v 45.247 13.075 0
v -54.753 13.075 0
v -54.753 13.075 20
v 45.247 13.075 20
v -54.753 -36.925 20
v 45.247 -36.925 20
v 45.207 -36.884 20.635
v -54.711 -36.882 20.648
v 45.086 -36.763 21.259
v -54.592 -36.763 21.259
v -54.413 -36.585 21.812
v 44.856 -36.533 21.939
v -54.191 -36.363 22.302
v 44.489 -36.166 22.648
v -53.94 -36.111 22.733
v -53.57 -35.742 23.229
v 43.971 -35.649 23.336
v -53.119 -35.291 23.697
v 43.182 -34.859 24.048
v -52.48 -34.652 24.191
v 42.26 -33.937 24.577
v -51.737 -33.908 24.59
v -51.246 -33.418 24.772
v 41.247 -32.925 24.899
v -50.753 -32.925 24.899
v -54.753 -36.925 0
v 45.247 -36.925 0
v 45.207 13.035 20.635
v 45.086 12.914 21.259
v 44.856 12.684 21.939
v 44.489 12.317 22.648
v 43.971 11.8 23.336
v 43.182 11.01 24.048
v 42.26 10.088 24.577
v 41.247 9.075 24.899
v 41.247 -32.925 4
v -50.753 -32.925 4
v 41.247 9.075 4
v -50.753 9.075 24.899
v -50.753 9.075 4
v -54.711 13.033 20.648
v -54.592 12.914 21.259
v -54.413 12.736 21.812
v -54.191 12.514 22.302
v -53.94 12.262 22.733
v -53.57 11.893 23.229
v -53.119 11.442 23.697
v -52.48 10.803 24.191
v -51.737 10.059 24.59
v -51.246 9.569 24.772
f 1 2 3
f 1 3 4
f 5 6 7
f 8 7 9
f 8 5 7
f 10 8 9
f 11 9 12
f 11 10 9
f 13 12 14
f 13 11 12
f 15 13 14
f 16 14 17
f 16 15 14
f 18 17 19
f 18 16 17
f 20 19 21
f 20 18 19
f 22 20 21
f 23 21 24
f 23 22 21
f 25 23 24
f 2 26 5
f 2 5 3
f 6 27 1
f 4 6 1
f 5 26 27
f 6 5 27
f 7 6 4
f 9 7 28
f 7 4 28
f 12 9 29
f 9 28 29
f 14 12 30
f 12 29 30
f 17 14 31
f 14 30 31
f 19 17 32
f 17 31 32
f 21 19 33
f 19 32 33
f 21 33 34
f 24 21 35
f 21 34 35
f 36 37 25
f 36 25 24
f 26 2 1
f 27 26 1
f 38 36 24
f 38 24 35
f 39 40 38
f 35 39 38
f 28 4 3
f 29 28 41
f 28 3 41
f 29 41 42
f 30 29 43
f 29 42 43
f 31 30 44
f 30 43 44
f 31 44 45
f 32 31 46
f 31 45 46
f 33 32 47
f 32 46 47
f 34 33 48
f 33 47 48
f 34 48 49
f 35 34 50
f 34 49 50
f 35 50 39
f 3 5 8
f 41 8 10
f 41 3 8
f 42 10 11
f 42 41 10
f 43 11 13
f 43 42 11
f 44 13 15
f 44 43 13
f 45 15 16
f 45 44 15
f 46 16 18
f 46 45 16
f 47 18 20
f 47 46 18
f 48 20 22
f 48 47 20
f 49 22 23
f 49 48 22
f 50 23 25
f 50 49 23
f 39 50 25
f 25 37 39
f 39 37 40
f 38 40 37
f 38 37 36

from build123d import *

# Parameters (mm, degrees)
F0_W        = 100
F0_H        = 50
F1_DEPTH    = 25
F2_T        = -4
F3_T1_DEPTH = 75
F3_T3_DEPTH = 125


# Not quite as in the source:
# - a fillet or chamfer that OpenCascade refuses, or shapes differently, is made with other operations: its cross-section is extruded or revolved along the edge and cut away or added


with BuildPart() as f1:
    # F0 (on Top) → F1 (new body)
    with BuildSketch(Plane.XY):
        with Locations((-4.7528631985, -11.9245312498)):
            Rectangle(F0_W, F0_H)
    extrude(amount=F1_DEPTH)

    # F2
    f2_openings = [f1.faces().sort_by_distance(p)[0] for p in [
        (-4.752863, -11.924531, 25),
    ]]
    offset(amount=F2_T, openings=f2_openings)

    # F3: fillet of radius 5 on 4 edges, made by hand

    # F3_s2 → F3_t1 (cut)
    with BuildSketch(Plane.XZ.offset(-25.5754687502)):
        with BuildLine():
            ThreePointArc((-54.7528631985, 20), (-53.2883971045, 23.5355339059), (-49.7528631985, 25))
            Line((-49.7528631985, 25), (-54.7528631985, 25))
            Line((-54.7528631985, 25), (-54.7528631985, 20))
        make_face()
        with BuildLine():
            ThreePointArc((45.2471368015, 20), (43.7826707074, 23.5355339059), (40.2471368015, 25))
            Line((40.2471368015, 25), (45.2471368015, 25))
            Line((45.2471368015, 25), (45.2471368015, 20))
        make_face()
    extrude(amount=F3_T1_DEPTH, mode=Mode.SUBTRACT)

    # F3_s4 → F3_t3 (cut)
    with BuildSketch(Plane.YZ.offset(-67.2528631985)):
        with BuildLine():
            ThreePointArc((13.0754687502, 20), (11.6110026561, 23.5355339059), (8.0754687502, 25))
            Line((8.0754687502, 25), (13.0754687502, 25))
            Line((13.0754687502, 25), (13.0754687502, 20))
        make_face()
        with BuildLine():
            ThreePointArc((-36.9245312498, 20), (-35.4600651557, 23.5355339059), (-31.9245312498, 25))
            Line((-31.9245312498, 25), (-36.9245312498, 25))
            Line((-36.9245312498, 25), (-36.9245312498, 20))
        make_face()
    extrude(amount=F3_T3_DEPTH, mode=Mode.SUBTRACT)


solid = f1.part
